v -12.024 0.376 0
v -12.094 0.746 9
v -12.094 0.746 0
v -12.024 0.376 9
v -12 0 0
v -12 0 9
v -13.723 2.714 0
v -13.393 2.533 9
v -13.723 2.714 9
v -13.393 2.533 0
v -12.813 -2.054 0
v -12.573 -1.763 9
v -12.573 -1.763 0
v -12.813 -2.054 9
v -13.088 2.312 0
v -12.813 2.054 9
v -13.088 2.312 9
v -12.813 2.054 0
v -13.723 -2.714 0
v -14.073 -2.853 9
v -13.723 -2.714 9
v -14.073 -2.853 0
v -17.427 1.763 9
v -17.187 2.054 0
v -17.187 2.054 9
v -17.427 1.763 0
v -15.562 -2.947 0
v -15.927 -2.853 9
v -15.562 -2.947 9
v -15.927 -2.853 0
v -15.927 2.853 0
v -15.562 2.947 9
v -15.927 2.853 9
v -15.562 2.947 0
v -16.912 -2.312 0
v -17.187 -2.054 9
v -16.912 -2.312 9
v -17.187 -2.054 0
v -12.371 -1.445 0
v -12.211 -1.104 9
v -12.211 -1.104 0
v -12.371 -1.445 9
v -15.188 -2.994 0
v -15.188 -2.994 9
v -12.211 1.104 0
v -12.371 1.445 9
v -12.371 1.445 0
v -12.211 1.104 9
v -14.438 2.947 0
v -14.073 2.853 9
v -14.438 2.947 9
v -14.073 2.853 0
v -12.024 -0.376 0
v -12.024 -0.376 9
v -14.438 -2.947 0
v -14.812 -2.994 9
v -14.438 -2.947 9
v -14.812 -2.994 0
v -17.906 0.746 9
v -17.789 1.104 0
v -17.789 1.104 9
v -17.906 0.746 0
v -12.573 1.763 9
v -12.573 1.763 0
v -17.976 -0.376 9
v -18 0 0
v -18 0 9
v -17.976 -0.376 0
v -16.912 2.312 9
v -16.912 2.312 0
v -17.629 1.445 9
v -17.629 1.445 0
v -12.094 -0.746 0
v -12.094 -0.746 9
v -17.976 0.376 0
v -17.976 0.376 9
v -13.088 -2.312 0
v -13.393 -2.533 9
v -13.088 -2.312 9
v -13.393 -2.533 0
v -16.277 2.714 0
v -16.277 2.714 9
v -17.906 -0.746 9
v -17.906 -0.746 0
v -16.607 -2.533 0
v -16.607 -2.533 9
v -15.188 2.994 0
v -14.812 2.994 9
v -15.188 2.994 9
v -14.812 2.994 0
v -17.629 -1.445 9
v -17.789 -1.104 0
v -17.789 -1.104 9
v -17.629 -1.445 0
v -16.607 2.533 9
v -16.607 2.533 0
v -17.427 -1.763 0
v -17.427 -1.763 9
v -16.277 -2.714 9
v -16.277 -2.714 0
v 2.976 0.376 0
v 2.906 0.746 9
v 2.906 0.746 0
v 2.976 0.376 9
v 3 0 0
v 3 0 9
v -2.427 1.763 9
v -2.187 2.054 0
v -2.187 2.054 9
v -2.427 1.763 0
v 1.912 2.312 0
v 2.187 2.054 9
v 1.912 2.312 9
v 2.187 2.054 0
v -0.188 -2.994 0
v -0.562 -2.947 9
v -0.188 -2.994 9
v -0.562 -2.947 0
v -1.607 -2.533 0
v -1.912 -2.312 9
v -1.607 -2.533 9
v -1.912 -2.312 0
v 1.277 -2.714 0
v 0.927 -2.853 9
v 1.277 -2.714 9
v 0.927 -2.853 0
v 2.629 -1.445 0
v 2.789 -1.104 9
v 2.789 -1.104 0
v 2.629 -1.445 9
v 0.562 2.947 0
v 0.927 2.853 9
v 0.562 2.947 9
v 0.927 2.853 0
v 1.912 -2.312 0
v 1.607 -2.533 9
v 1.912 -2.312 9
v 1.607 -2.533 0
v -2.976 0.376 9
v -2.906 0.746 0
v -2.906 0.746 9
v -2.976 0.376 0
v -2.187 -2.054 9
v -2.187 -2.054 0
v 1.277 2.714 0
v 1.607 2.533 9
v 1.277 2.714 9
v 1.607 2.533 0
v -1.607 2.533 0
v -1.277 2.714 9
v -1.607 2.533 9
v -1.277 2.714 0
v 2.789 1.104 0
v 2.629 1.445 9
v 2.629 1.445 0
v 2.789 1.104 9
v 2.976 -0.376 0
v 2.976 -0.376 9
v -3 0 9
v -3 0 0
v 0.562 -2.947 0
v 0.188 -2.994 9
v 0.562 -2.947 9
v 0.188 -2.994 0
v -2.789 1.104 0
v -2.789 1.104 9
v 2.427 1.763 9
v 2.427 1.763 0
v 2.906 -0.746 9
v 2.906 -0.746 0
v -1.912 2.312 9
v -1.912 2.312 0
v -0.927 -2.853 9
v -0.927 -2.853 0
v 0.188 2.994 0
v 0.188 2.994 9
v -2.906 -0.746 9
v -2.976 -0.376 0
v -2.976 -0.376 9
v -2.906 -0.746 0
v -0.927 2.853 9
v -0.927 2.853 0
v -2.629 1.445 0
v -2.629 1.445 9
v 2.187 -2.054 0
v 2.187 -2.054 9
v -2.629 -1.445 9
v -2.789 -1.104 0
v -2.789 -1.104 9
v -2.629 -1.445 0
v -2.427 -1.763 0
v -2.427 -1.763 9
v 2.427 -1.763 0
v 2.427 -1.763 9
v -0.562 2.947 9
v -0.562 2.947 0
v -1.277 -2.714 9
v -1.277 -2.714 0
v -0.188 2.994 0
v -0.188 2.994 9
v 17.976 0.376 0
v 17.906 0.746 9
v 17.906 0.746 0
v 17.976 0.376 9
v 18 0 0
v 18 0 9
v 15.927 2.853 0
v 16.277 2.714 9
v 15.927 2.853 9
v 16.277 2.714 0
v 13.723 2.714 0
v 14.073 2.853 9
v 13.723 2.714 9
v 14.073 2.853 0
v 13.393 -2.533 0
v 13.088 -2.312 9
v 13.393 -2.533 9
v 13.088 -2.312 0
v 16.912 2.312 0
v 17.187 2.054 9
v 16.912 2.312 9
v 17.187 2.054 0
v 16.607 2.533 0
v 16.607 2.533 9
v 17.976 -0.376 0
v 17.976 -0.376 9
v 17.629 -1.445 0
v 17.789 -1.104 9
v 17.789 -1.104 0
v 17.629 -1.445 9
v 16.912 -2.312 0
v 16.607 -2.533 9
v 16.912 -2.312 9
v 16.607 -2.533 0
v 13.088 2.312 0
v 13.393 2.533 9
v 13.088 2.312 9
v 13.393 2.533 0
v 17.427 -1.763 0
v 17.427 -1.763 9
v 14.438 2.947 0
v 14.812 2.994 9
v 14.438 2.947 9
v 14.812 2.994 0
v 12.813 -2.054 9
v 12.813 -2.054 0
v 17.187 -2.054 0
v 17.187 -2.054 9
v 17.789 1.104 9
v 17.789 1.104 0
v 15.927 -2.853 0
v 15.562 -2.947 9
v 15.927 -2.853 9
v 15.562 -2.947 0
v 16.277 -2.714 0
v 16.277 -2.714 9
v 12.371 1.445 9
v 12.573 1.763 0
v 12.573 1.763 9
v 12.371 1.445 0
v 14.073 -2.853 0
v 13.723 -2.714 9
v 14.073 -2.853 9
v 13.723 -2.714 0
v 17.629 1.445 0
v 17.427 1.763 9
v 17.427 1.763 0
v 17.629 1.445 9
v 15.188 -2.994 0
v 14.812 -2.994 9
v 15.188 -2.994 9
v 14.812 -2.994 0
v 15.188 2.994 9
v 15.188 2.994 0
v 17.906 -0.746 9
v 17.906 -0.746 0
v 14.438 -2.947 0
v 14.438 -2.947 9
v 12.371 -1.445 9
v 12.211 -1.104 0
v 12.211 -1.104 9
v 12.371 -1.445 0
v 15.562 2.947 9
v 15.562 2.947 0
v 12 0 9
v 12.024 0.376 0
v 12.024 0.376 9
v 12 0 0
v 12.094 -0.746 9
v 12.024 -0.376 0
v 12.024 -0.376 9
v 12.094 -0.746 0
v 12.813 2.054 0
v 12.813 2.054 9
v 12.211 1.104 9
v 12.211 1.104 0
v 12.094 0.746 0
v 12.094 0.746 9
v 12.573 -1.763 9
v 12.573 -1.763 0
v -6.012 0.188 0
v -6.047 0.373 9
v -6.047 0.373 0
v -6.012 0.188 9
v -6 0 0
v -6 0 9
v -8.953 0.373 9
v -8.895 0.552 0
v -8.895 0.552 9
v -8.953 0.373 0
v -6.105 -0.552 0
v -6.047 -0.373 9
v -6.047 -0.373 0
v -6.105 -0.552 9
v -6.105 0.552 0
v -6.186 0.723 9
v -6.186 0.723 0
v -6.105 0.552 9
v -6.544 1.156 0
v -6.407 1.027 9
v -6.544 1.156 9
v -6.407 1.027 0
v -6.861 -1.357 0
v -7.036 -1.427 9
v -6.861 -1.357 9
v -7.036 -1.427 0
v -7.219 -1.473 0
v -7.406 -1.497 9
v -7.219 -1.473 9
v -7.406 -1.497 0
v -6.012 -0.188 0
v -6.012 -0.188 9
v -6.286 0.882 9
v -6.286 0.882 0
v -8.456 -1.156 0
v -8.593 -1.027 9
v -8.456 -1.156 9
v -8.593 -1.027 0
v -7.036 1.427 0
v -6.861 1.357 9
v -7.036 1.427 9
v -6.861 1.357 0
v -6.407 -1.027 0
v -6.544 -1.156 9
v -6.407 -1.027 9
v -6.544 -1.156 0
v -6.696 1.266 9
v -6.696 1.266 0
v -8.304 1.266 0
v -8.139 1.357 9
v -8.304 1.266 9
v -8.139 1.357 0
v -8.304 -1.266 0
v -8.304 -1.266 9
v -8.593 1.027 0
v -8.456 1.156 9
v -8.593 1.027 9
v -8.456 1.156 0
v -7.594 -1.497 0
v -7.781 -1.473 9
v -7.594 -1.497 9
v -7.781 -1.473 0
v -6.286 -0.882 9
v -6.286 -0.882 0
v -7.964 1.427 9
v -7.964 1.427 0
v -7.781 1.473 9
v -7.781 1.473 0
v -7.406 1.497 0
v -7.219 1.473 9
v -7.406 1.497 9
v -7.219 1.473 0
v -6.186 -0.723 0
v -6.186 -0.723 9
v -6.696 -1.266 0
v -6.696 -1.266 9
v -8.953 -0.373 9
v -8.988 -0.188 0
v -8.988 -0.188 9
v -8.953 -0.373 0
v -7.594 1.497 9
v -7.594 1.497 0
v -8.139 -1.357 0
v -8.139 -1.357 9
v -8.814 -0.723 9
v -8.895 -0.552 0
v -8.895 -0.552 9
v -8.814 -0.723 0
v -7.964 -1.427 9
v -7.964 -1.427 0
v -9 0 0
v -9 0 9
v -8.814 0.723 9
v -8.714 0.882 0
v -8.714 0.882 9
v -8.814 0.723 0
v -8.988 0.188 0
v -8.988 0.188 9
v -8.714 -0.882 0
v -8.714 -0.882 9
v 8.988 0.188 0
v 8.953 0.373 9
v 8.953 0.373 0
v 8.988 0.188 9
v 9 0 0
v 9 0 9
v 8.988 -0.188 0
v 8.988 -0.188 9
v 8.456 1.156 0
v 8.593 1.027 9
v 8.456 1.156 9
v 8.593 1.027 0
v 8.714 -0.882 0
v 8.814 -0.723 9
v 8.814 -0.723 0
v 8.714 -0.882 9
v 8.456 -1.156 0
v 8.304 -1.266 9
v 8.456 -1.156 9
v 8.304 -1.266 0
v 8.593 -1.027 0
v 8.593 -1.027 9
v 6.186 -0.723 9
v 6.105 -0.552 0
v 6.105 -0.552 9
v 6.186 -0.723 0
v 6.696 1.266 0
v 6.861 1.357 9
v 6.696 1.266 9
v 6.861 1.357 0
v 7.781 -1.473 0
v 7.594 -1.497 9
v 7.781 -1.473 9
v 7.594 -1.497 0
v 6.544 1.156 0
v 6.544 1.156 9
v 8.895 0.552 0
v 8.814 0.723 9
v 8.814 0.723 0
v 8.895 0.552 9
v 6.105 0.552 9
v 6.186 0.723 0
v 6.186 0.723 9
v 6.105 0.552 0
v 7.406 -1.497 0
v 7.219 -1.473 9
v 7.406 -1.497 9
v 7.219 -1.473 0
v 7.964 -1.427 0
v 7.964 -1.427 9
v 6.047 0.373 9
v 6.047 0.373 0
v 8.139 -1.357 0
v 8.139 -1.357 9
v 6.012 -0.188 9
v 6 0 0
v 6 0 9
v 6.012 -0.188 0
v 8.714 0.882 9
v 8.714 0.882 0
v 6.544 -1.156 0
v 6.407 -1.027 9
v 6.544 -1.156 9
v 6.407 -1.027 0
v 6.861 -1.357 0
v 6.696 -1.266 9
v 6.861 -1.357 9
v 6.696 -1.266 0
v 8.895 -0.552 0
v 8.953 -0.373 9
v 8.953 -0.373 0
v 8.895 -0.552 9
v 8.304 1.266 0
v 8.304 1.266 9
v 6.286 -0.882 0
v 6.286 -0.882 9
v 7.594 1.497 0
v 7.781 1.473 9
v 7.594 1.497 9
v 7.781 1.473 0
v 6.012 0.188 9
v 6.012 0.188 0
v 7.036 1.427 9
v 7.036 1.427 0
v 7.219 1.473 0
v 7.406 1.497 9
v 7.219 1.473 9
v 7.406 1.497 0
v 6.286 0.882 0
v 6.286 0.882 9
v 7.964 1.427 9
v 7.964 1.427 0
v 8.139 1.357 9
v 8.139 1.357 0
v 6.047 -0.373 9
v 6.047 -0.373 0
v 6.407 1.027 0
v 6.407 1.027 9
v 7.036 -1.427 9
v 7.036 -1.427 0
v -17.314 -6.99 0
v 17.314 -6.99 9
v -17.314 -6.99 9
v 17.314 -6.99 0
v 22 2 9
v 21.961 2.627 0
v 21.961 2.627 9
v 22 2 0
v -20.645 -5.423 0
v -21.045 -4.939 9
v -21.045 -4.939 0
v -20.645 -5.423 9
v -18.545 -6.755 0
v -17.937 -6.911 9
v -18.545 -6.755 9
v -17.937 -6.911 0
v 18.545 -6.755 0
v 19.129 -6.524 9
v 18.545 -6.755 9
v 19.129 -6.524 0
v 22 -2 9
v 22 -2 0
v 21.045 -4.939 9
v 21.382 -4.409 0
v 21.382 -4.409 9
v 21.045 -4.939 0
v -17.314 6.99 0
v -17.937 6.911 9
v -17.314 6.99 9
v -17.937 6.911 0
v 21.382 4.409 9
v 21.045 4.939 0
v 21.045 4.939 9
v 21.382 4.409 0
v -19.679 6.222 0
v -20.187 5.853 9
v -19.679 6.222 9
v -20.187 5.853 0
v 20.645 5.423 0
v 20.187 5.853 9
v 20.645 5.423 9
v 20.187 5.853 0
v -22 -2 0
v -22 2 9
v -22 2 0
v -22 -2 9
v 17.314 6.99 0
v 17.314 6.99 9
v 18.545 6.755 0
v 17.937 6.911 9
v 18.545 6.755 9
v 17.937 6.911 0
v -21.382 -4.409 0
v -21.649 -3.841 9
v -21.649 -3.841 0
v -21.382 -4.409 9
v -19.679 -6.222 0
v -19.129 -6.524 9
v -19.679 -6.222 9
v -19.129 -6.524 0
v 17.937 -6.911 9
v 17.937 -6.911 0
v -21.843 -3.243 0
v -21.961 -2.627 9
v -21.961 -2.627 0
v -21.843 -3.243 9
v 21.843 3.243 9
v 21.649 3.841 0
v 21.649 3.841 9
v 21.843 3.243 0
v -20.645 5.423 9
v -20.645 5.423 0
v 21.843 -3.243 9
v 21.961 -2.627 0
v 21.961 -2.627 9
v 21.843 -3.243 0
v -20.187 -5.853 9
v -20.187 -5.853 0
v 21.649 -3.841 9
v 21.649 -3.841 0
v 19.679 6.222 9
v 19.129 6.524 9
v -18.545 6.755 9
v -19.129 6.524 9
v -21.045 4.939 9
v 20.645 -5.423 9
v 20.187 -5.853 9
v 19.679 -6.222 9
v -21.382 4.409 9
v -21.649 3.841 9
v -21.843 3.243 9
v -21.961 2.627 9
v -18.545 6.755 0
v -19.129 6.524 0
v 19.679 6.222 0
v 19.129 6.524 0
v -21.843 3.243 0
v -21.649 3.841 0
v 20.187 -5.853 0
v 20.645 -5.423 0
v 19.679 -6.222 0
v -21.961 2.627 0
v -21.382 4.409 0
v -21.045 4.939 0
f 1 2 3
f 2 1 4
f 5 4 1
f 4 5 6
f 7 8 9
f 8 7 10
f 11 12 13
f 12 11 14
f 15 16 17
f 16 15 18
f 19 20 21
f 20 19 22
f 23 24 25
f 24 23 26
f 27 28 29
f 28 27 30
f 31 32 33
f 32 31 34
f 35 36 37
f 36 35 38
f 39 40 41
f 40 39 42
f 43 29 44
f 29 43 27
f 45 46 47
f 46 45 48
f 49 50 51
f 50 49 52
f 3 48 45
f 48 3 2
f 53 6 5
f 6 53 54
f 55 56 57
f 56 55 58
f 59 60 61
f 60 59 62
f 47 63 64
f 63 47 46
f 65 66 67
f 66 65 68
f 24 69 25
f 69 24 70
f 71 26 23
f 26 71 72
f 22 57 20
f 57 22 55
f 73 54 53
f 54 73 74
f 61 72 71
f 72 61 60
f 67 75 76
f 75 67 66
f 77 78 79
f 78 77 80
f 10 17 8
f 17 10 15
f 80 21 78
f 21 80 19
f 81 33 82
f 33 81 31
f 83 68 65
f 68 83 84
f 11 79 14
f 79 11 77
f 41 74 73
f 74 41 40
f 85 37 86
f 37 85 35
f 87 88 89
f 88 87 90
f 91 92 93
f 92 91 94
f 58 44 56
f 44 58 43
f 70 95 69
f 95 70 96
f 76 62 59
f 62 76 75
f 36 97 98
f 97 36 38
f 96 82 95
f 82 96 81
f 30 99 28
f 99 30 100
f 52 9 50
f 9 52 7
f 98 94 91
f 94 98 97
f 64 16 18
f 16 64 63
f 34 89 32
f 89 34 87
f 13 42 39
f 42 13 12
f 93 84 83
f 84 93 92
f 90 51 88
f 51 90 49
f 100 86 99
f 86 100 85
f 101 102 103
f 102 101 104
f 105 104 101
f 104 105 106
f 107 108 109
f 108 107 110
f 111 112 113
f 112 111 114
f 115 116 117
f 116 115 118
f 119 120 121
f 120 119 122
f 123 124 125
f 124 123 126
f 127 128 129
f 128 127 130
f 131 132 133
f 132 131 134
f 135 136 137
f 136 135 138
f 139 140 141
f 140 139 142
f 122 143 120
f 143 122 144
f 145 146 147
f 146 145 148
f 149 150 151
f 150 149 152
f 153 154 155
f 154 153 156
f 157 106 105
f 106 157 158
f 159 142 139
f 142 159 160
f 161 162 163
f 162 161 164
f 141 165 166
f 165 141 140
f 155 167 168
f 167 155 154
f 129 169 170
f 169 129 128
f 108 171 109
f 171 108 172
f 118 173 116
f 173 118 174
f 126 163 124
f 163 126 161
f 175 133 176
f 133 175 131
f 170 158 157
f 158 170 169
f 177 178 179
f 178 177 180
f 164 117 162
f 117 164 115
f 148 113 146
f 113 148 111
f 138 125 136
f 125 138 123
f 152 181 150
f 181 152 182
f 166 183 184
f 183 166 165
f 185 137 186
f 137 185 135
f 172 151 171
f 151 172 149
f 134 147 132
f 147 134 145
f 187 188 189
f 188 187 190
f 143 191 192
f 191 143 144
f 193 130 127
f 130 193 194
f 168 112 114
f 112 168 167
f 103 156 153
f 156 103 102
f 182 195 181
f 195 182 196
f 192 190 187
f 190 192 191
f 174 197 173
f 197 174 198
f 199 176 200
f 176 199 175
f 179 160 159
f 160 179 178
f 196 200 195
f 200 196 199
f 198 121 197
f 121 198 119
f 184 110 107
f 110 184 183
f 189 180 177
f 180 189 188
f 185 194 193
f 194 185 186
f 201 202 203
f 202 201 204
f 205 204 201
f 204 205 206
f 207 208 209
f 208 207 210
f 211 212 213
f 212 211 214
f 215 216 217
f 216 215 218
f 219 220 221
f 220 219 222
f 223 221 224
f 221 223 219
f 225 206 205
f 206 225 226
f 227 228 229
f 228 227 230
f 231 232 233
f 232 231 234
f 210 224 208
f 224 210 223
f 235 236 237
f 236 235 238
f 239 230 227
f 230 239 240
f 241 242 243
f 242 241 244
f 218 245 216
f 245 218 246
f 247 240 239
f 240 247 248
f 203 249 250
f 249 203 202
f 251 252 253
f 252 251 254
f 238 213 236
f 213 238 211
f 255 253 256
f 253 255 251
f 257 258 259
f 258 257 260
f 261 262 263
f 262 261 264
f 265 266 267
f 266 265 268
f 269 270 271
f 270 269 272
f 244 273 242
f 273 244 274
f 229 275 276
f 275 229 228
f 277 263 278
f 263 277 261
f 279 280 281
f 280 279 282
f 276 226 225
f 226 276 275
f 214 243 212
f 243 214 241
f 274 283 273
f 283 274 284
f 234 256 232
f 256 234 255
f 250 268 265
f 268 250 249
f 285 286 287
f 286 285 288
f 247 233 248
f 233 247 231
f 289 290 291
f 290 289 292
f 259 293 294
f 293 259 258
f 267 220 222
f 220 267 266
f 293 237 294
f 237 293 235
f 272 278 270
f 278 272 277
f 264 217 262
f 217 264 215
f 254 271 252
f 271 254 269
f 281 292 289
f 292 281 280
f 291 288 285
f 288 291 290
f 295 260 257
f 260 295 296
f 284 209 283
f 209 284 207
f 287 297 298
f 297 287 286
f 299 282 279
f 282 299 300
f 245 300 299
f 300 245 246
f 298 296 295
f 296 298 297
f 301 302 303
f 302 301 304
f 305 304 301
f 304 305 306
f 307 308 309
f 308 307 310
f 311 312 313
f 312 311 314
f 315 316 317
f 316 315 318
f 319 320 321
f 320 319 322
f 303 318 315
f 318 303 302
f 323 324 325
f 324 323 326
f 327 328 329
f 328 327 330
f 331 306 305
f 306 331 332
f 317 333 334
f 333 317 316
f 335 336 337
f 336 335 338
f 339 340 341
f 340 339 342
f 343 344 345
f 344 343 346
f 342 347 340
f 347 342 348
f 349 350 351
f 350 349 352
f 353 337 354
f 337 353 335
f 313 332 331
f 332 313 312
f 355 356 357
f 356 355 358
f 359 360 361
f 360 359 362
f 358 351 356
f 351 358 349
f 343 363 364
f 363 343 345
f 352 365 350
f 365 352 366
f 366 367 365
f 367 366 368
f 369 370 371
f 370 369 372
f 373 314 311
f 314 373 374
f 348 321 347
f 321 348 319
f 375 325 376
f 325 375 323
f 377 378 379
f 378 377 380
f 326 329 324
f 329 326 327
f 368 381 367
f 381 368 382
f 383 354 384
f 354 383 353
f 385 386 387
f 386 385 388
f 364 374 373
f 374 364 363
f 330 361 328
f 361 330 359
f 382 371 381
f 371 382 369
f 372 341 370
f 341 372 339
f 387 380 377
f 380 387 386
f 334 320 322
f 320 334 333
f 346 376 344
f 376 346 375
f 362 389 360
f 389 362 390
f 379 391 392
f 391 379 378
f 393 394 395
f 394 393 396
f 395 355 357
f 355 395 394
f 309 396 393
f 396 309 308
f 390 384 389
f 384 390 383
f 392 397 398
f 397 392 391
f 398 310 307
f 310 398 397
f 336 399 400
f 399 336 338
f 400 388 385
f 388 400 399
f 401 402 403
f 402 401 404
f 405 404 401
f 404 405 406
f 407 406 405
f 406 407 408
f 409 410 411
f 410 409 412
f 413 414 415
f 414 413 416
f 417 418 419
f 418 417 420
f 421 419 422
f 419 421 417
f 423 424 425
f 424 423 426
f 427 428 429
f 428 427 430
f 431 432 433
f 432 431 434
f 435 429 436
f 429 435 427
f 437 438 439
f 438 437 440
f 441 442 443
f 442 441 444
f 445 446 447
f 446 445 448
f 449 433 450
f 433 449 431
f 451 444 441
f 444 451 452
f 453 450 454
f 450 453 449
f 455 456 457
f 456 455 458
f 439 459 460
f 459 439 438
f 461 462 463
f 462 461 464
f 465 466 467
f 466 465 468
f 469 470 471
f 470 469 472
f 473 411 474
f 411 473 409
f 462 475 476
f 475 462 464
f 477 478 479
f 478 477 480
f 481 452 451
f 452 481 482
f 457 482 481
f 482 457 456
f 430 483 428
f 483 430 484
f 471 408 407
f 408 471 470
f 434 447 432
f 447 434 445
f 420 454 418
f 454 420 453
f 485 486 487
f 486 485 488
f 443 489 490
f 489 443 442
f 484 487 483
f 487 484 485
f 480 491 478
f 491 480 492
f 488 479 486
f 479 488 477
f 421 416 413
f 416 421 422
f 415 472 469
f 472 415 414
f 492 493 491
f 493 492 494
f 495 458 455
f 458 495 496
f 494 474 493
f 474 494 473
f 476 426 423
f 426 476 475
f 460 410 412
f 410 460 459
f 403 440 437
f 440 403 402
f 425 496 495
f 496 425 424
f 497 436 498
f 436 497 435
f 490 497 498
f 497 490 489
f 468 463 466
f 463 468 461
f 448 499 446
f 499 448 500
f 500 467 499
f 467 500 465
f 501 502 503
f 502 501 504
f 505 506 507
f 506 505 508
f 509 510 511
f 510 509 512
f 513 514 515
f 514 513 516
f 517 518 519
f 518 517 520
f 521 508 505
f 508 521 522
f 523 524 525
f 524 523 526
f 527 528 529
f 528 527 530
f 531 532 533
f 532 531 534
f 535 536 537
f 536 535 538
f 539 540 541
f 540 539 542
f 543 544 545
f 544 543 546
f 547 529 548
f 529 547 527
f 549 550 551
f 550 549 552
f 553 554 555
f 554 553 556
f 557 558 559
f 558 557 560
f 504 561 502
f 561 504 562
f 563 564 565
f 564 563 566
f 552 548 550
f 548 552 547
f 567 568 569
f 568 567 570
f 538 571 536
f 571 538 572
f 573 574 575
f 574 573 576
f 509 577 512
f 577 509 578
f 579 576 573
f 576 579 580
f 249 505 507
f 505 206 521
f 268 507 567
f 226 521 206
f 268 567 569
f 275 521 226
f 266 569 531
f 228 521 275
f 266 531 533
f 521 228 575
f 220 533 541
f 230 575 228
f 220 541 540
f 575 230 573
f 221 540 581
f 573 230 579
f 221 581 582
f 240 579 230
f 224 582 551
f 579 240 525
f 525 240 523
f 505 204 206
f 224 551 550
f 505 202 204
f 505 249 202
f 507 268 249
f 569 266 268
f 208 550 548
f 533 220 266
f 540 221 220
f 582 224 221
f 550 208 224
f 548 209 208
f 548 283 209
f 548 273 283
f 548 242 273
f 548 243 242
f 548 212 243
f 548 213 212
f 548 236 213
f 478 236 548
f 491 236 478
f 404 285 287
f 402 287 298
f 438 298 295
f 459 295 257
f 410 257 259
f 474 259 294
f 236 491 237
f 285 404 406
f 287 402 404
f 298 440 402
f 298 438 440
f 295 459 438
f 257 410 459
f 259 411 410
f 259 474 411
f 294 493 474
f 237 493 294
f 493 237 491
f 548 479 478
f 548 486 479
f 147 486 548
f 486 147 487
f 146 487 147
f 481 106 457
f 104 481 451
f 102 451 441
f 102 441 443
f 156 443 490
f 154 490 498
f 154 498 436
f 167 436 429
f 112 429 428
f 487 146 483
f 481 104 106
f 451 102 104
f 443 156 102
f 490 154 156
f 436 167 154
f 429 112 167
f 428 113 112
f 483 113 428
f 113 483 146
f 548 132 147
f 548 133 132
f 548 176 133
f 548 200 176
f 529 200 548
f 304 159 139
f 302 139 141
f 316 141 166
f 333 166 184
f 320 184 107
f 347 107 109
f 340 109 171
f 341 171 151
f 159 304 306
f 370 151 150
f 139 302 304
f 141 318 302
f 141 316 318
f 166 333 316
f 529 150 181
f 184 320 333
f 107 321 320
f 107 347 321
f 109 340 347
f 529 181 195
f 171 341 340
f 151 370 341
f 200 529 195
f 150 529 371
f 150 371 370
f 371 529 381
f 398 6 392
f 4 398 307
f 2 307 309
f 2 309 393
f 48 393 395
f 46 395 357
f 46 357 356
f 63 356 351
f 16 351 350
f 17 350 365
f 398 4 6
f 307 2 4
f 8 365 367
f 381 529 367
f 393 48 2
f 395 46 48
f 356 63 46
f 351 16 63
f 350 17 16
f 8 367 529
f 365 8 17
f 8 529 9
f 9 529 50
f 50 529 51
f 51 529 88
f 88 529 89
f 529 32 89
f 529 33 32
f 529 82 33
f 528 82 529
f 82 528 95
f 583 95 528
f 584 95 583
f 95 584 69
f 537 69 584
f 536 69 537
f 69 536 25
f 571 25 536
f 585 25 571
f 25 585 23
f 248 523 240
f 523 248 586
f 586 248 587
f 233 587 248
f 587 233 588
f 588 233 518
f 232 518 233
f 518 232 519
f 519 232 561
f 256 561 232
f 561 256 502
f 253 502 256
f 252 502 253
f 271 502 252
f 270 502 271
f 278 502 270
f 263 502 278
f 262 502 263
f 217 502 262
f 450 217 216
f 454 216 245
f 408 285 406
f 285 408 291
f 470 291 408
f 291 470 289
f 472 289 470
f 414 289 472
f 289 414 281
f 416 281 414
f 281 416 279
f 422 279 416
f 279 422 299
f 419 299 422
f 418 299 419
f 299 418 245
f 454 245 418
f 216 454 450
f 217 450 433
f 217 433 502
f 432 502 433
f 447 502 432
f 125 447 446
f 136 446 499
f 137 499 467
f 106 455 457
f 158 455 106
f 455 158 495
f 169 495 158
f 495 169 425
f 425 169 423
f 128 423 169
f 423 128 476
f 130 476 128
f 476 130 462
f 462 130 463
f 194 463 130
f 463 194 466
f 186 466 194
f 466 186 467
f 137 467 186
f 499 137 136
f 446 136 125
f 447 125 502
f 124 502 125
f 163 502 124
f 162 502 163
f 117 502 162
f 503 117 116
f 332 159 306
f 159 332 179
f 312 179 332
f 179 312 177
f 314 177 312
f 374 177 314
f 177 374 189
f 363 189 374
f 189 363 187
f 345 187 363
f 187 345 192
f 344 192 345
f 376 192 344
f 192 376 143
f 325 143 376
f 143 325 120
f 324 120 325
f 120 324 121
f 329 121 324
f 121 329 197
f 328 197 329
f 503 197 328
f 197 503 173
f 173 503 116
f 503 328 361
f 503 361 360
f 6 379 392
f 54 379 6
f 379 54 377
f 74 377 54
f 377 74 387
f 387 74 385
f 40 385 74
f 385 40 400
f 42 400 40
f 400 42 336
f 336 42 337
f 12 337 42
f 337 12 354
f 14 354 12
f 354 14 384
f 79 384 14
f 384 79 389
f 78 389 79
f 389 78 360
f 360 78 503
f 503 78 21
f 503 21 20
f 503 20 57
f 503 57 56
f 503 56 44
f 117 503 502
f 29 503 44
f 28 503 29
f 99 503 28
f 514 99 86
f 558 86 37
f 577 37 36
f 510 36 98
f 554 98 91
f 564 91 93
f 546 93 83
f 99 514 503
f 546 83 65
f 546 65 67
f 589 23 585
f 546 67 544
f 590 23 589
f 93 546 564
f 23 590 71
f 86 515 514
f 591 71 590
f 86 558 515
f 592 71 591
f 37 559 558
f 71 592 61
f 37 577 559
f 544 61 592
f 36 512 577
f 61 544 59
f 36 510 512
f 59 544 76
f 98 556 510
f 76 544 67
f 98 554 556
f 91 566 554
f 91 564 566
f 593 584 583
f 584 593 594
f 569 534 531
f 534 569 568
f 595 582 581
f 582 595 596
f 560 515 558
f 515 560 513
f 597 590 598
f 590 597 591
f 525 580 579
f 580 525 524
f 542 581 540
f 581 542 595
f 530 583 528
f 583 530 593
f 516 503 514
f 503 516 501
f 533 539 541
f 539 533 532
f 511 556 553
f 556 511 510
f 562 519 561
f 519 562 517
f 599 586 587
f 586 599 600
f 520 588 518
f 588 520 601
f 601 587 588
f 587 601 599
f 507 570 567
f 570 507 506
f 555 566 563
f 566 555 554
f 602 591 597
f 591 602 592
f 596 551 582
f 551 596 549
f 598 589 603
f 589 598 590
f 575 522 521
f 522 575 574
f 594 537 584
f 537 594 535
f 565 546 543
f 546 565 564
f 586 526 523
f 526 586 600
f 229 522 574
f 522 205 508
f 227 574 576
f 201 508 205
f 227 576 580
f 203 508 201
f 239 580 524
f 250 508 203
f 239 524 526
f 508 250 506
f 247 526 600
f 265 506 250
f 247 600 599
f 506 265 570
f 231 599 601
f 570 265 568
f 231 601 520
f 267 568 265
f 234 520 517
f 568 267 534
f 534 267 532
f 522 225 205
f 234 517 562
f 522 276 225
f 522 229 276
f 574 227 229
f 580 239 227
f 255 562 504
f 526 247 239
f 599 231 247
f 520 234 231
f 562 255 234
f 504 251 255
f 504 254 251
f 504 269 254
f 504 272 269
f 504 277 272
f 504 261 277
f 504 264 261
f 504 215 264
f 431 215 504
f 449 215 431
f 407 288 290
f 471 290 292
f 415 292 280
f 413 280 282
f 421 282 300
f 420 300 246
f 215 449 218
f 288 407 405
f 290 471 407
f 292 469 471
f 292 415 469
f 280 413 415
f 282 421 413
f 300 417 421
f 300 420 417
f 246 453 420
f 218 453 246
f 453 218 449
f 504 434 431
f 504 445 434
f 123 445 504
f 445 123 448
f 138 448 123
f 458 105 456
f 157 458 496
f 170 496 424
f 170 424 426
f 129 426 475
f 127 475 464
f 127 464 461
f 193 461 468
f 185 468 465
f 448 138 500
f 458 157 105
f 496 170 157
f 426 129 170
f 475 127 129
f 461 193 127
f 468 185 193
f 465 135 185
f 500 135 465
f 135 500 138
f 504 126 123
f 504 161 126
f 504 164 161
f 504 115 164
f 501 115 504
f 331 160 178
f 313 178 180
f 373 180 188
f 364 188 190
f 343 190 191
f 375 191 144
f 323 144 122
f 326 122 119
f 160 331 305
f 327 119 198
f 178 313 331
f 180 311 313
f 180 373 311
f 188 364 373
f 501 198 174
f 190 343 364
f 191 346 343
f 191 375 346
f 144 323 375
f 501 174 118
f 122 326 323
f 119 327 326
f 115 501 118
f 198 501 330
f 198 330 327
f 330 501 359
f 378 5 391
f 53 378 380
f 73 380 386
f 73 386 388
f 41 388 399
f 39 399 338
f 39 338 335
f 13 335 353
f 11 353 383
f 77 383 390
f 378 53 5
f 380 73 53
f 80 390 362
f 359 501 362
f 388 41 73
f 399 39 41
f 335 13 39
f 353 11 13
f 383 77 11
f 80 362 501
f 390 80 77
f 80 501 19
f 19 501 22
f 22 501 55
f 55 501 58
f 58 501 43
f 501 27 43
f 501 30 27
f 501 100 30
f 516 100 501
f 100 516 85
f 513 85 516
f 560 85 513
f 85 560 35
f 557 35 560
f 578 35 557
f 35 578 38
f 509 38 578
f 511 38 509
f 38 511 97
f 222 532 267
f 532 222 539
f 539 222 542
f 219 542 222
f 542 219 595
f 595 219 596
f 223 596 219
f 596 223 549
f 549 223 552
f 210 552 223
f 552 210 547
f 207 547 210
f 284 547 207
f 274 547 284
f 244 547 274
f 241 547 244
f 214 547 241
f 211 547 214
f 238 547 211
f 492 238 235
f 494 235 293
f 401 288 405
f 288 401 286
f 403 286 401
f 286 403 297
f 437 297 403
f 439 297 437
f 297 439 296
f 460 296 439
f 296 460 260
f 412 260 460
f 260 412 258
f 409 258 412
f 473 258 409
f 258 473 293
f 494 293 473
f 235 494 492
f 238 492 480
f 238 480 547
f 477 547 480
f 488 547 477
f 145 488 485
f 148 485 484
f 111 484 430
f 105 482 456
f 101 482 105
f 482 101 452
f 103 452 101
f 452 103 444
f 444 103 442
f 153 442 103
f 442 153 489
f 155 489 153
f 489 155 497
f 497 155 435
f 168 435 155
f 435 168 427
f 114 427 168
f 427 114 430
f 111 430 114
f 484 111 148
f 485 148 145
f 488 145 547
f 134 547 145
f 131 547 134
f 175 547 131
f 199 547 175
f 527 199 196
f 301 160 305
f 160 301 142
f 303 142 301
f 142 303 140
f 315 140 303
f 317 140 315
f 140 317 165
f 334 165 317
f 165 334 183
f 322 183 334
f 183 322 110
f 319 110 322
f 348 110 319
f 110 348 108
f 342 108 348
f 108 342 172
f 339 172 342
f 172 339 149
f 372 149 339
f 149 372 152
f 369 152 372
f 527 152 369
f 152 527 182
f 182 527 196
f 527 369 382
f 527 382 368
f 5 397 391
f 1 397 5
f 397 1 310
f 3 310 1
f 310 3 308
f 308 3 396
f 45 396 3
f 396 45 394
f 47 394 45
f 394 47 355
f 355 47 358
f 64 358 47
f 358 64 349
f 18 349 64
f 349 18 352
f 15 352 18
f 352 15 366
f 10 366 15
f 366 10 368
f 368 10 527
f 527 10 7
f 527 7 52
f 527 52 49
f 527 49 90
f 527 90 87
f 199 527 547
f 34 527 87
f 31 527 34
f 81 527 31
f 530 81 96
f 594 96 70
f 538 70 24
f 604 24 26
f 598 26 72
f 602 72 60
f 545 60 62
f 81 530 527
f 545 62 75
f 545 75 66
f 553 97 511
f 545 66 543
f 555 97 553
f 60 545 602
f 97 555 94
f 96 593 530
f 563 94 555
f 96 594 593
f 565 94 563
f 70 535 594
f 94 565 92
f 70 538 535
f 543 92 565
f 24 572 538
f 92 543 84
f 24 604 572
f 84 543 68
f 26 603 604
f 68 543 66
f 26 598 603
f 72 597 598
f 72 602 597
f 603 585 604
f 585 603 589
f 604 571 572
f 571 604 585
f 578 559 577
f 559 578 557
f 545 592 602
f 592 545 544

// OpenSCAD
$fn = 50;


difference() {
	union() {
		*color(alpha = 1.0000000000, c = "gray") {
			translate(v = [0, 7, 0]) {
				linear_extrude(height = 1) {
					text(font = "Arial:style=Bold", halign = "center", size = 4.5000000000, text = "COMMENT plate main", valign = "center");
				}
			}
		}
		hull() {
			translate(v = [-17.0000000000, 2.0000000000, 0]) {
				cylinder(h = 9, r = 5);
			}
			translate(v = [17.0000000000, 2.0000000000, 0]) {
				cylinder(h = 9, r = 5);
			}
			translate(v = [-17.0000000000, -2.0000000000, 0]) {
				cylinder(h = 9, r = 5);
			}
			translate(v = [17.0000000000, -2.0000000000, 0]) {
				cylinder(h = 9, r = 5);
			}
		}
	}
	union() {
		*color(alpha = 1.0000000000, c = "gray") {
			translate(v = [0, 7, 0]) {
				linear_extrude(height = 1) {
					text(font = "Arial:style=Bold", halign = "center", size = 4.5000000000, text = "COMMENT holes main", valign = "center");
				}
			}
		}
		translate(v = [-15.0000000000, 0.0000000000, 0]) {
			translate(v = [0, 0, -100]) {
				cylinder(h = 200, r = 3.0000000000);
			}
		}
		translate(v = [0, 0, -100]) {
			cylinder(h = 200, r = 3.0000000000);
		}
		translate(v = [15.0000000000, 0.0000000000, 0]) {
			translate(v = [0, 0, -100]) {
				cylinder(h = 200, r = 3.0000000000);
			}
		}
		translate(v = [-15.0000000000, 0.0000000000, 0]) {
			translate(v = [0, 0, -100]) {
				cylinder(h = 200, r = 1.5000000000);
			}
		}
		translate(v = [-7.5000000000, 0.0000000000, 0]) {
			translate(v = [0, 0, -100]) {
				cylinder(h = 200, r = 1.5000000000);
			}
		}
		translate(v = [0, 0, -100]) {
			cylinder(h = 200, r = 1.5000000000);
		}
		translate(v = [7.5000000000, 0.0000000000, 0]) {
			translate(v = [0, 0, -100]) {
				cylinder(h = 200, r = 1.5000000000);
			}
		}
		translate(v = [15.0000000000, 0.0000000000, 0]) {
			translate(v = [0, 0, -100]) {
				cylinder(h = 200, r = 1.5000000000);
			}
		}
	}
}
